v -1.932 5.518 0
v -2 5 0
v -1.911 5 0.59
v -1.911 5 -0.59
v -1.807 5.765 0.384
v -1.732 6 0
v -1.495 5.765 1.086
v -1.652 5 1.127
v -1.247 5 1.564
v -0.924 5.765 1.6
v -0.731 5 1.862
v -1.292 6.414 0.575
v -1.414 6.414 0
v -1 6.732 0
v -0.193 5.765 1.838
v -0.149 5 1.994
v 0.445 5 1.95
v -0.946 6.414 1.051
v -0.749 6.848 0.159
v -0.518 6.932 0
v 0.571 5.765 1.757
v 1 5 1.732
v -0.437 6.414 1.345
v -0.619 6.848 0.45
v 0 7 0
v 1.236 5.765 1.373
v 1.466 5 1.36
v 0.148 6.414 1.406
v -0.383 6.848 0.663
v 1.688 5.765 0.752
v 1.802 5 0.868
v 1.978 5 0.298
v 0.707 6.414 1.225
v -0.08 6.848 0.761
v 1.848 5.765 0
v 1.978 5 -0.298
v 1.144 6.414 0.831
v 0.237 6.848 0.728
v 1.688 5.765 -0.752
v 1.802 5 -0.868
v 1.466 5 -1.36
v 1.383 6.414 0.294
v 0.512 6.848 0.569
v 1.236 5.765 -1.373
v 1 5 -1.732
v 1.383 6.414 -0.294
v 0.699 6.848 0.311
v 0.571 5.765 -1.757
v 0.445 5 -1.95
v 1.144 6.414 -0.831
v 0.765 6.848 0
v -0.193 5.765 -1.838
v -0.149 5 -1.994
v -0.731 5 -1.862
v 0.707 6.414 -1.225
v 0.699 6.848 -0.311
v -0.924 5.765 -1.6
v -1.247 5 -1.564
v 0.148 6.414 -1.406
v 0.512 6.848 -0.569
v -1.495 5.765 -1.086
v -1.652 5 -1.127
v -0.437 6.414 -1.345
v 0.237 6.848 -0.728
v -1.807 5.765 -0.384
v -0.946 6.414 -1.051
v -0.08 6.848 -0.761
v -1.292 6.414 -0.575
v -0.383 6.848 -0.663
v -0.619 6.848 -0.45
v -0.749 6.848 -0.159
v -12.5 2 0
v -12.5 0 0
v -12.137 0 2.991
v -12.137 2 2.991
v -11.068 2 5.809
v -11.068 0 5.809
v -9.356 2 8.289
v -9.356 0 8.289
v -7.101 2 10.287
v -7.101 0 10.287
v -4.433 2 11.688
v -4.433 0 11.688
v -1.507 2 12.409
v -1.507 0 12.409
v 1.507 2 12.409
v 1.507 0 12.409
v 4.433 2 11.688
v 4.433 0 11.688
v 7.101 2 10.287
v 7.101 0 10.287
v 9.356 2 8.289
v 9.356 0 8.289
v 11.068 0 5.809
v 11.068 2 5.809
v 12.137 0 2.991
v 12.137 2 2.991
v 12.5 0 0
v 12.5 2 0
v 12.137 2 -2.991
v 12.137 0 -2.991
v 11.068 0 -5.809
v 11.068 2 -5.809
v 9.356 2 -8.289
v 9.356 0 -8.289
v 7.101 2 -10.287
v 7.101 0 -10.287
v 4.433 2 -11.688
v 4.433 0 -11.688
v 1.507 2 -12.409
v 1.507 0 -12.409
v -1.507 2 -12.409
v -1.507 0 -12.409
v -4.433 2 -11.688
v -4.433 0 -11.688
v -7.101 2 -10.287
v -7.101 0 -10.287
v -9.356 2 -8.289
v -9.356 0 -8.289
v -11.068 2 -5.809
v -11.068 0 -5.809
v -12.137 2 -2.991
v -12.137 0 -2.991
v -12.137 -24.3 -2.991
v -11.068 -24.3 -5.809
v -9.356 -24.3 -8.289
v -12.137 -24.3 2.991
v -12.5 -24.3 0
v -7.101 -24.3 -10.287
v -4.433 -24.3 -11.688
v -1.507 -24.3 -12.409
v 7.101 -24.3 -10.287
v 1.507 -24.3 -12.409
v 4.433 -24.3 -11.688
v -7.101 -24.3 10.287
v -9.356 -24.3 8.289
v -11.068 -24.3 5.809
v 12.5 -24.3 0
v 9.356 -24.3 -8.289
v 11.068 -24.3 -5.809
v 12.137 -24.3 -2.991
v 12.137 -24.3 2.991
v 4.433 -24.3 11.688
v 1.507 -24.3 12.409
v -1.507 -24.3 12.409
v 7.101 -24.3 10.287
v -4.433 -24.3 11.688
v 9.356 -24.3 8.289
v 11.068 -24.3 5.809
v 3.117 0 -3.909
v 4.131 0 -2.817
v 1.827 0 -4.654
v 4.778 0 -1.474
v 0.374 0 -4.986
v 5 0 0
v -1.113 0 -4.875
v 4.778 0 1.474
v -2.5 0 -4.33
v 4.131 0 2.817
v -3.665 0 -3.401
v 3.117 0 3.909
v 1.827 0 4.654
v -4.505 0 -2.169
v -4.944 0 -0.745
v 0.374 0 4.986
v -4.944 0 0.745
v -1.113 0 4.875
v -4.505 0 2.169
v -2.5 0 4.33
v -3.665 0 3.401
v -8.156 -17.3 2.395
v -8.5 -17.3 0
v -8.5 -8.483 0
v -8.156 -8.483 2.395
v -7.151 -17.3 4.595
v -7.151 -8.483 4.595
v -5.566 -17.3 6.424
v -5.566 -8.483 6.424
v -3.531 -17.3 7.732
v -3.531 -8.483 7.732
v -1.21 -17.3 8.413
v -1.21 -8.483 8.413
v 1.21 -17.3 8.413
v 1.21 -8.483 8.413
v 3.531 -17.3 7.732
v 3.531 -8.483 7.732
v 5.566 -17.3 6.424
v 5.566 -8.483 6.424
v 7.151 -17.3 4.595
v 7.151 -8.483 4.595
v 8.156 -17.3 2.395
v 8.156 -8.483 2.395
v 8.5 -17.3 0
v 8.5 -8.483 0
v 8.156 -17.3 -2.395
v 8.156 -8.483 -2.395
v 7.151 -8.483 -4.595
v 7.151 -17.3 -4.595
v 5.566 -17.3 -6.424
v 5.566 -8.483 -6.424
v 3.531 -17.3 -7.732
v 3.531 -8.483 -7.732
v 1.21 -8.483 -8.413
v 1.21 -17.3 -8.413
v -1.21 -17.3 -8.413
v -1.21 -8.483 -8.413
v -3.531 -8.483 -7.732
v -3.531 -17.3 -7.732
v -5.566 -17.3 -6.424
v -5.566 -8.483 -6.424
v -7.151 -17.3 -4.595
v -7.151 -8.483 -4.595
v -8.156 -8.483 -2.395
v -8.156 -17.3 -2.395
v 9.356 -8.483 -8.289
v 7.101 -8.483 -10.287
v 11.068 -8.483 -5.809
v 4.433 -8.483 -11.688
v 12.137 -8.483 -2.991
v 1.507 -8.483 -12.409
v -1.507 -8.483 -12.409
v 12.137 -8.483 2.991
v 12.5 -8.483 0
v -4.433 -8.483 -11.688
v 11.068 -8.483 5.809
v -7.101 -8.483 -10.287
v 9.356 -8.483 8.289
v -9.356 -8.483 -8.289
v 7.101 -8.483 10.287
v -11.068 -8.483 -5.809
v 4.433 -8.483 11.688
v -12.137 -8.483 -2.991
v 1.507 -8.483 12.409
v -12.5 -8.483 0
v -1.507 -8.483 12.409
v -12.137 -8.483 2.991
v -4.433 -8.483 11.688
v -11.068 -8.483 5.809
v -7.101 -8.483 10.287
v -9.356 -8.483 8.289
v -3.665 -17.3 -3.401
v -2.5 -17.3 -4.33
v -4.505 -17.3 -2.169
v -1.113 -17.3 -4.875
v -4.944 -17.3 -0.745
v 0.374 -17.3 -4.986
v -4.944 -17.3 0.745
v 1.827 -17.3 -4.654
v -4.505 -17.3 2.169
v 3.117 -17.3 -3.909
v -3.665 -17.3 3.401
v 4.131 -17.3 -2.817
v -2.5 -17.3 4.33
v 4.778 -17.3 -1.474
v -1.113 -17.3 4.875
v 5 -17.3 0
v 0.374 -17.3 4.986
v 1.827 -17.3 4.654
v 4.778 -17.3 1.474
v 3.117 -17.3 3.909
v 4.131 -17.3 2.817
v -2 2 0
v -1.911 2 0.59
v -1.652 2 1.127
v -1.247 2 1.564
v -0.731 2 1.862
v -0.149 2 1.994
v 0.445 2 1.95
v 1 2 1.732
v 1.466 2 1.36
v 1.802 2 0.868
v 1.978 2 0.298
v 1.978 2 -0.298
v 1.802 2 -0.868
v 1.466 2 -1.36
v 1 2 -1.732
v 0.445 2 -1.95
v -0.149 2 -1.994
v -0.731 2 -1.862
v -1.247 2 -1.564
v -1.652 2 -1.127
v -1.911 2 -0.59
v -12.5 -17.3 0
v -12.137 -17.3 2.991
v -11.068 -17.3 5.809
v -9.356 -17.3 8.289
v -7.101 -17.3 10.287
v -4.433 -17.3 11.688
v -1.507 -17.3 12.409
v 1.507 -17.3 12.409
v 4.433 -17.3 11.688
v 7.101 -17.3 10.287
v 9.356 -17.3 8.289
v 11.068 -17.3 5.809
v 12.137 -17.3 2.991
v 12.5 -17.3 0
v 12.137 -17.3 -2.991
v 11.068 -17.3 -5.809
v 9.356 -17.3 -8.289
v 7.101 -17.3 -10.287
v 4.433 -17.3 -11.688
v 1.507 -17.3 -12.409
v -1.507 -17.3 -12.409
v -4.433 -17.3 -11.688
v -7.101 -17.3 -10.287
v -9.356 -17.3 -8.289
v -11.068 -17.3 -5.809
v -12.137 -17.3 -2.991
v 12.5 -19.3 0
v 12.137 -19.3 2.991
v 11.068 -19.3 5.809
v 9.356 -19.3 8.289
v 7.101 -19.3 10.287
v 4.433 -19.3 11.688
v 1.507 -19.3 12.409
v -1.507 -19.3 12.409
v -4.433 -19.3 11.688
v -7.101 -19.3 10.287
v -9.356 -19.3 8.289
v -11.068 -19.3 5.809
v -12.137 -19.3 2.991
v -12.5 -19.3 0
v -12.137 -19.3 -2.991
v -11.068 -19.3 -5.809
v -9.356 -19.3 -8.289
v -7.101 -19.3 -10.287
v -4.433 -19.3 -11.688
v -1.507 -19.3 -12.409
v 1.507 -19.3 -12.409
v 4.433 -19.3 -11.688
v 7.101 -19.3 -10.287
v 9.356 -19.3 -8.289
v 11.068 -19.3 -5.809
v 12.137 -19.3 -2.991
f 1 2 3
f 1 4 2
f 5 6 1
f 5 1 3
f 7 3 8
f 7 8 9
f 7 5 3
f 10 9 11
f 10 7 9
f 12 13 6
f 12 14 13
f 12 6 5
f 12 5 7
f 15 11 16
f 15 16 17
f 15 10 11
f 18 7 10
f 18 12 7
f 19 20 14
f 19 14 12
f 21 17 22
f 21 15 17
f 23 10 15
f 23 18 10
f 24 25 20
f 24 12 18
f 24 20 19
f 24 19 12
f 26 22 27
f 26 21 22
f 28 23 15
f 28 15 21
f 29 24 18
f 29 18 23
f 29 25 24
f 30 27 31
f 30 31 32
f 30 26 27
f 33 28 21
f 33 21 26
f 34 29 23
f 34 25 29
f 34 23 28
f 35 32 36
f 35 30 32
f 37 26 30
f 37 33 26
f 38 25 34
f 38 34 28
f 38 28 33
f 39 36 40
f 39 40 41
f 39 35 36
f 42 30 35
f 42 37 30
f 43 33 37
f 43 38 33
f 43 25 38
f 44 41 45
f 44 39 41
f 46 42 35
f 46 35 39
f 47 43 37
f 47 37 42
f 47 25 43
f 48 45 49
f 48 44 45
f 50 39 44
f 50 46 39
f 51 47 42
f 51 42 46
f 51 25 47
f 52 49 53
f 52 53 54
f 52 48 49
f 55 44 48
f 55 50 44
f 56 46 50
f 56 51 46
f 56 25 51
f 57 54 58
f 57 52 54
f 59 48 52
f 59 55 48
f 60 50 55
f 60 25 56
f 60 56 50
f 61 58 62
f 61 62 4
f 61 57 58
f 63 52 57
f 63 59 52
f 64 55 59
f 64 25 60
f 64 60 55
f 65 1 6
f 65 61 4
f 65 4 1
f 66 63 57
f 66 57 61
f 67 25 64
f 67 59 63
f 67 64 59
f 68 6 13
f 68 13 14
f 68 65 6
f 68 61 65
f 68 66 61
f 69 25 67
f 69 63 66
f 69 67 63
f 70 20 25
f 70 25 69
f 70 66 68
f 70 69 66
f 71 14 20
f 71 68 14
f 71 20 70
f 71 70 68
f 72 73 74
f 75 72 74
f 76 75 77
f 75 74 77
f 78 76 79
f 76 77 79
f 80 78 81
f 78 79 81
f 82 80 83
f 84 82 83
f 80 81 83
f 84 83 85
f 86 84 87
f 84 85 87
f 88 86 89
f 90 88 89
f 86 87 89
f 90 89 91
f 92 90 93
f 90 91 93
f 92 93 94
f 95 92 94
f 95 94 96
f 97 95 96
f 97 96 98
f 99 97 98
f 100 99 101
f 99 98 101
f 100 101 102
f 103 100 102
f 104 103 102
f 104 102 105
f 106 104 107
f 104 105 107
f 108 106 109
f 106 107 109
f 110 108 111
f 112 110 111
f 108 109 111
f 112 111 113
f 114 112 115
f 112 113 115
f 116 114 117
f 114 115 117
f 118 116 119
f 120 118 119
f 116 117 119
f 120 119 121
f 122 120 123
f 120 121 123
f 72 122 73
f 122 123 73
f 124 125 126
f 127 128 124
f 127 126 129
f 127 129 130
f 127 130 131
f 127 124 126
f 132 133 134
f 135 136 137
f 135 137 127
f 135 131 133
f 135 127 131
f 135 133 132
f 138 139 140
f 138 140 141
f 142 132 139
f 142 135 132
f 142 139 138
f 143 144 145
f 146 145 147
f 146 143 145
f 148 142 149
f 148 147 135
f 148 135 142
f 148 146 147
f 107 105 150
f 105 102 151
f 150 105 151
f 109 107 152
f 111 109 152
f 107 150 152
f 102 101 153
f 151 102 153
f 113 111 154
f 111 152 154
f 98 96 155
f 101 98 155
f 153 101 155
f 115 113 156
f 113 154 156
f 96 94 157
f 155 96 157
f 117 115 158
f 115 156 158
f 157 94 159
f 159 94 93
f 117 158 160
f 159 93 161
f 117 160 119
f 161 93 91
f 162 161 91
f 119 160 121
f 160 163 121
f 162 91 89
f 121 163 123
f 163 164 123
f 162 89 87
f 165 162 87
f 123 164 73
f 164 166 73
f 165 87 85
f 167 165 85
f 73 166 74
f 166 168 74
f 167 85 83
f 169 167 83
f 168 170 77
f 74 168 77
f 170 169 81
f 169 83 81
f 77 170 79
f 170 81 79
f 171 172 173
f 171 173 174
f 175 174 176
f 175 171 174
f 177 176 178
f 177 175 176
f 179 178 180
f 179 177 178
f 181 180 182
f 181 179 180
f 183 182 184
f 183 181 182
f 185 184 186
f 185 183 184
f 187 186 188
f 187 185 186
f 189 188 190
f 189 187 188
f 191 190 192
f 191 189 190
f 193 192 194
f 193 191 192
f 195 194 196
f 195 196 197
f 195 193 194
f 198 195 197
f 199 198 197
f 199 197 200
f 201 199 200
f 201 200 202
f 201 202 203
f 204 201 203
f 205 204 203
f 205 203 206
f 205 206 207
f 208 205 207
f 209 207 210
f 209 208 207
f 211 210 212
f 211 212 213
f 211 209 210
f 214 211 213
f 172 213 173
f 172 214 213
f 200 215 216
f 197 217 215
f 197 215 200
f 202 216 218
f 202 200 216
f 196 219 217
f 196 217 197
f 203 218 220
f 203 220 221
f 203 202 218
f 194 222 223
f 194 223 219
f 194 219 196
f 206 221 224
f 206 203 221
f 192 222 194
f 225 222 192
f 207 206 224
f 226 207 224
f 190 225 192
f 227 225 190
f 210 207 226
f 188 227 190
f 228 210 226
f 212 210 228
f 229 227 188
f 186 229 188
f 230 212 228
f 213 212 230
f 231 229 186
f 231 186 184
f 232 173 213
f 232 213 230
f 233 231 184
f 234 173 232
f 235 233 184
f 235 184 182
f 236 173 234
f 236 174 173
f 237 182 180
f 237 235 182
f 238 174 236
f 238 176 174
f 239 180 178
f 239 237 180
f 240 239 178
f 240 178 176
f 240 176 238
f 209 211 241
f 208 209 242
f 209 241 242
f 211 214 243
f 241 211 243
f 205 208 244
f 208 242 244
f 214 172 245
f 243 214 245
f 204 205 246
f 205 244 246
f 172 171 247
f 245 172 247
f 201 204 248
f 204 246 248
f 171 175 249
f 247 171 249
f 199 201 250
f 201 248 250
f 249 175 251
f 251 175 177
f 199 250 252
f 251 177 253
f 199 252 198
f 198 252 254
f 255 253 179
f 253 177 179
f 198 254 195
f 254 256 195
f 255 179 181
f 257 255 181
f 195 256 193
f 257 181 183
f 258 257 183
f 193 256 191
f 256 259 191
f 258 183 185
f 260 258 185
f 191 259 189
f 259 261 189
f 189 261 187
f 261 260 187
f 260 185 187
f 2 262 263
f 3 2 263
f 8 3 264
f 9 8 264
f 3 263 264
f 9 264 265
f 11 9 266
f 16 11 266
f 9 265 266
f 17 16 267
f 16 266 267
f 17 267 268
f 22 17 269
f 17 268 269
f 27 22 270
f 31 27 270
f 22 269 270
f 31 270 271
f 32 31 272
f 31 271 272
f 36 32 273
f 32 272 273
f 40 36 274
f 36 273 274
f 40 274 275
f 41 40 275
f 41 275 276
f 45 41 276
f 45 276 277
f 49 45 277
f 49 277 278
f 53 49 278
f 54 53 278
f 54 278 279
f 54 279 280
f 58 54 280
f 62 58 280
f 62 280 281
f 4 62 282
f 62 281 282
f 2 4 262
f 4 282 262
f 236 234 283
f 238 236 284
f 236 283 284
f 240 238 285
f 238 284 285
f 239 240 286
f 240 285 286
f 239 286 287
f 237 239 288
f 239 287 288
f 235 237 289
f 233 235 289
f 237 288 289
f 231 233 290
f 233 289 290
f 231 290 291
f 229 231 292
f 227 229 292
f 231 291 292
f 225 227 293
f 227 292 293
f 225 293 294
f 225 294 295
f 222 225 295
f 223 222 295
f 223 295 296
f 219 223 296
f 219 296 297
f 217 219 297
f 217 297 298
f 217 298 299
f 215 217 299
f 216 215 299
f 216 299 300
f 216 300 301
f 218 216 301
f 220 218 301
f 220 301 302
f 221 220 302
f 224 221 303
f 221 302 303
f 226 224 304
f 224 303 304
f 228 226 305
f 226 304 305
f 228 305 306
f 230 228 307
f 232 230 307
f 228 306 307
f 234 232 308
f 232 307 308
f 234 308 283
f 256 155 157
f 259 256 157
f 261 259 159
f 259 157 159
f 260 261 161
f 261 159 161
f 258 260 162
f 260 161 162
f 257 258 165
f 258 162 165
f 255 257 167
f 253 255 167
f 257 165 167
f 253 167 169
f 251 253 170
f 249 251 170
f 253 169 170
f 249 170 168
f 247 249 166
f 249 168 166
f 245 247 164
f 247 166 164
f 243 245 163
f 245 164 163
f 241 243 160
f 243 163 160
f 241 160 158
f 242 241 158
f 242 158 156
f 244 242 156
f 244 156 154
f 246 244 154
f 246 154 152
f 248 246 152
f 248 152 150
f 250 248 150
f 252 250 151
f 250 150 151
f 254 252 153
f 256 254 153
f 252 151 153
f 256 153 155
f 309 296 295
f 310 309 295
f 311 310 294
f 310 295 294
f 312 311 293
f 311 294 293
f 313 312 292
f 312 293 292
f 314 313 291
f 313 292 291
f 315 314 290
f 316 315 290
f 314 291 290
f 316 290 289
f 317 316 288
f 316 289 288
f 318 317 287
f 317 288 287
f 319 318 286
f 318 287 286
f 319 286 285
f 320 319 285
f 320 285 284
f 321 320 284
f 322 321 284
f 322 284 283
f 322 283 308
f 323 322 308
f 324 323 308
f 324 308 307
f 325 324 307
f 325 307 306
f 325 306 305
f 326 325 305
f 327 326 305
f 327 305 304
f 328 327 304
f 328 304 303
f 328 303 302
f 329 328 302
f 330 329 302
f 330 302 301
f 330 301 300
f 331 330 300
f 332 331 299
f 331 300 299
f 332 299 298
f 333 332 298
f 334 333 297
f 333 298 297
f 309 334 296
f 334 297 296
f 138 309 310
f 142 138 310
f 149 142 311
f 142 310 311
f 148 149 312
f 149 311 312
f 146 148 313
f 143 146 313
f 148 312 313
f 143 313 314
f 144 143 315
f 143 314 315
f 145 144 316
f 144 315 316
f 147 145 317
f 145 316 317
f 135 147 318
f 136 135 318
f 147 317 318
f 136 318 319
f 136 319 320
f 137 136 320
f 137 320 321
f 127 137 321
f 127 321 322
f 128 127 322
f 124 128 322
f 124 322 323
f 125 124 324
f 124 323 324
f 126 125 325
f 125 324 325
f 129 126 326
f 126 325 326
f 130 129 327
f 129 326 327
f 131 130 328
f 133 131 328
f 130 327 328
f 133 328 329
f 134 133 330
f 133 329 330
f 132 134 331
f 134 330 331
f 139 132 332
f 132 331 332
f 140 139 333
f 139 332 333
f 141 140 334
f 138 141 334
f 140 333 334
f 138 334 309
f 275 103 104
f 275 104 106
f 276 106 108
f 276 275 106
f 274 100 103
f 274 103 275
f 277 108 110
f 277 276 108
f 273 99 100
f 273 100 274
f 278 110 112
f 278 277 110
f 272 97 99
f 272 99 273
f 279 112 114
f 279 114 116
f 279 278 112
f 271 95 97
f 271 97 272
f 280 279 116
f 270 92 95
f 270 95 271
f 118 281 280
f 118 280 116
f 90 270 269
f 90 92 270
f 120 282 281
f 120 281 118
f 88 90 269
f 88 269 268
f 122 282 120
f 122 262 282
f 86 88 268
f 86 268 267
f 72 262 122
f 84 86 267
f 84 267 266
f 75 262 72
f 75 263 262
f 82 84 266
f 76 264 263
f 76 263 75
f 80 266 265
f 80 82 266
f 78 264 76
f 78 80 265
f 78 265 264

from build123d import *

# Parameters (mm, degrees)
F0_R      = 5
F1_DEPTH  = 17.3
F2_R      = 12.5
F3_DEPTH  = 2
F4_R      = 12.5
F4_R_2    = 8.5
F5_DEPTH  = 8.817
F6_R      = 12.5
F7_DEPTH  = 2
F8_R      = 2
F9_DEPTH  = 5
F10_R     = 2
F11_R     = 12.5
F12_DEPTH = 5


with BuildPart() as f1:
    # F0 (on Front) → F1 (new body)
    with BuildSketch(Plane.XZ):
        Circle(F0_R)
    extrude(amount=F1_DEPTH)

    # F2 (on face) → F3 (join)
    with BuildSketch(Plane.XZ.offset(17.3)):
        Circle(F2_R)
    extrude(amount=F3_DEPTH)

    # F4 (on face) → F5 (join)
    with BuildSketch(Plane(origin=(0, -17.3, 0), x_dir=(-1, 0, 0), z_dir=(0, 1, 0))):
        Circle(F4_R)
        Circle(F4_R_2, mode=Mode.SUBTRACT)
    extrude(amount=F5_DEPTH)

    # F6 (on face) → F7 (join)
    with BuildSketch(Plane(origin=(0, 0, 0), x_dir=(-1, 0, 0), z_dir=(0, 1, 0))):
        Circle(F6_R)
    extrude(amount=F7_DEPTH)

    # F8 (on face) → F9 (join)
    with BuildSketch(Plane(origin=(0, 2, 0), x_dir=(-1, 0, 0), z_dir=(0, 1, 0))):
        Circle(F8_R)
    extrude(amount=F9_DEPTH)

    # F10
    f10_edges = [f1.edges().sort_by_distance(p)[0] for p in [
        (2, 7, 0),
    ]]
    fillet(f10_edges, radius=F10_R)

    # F11 (on face) → F12 (join)
    with BuildSketch(Plane.XZ.offset(19.3)):
        Circle(F11_R)
    extrude(amount=F12_DEPTH)


solid = f1.part
